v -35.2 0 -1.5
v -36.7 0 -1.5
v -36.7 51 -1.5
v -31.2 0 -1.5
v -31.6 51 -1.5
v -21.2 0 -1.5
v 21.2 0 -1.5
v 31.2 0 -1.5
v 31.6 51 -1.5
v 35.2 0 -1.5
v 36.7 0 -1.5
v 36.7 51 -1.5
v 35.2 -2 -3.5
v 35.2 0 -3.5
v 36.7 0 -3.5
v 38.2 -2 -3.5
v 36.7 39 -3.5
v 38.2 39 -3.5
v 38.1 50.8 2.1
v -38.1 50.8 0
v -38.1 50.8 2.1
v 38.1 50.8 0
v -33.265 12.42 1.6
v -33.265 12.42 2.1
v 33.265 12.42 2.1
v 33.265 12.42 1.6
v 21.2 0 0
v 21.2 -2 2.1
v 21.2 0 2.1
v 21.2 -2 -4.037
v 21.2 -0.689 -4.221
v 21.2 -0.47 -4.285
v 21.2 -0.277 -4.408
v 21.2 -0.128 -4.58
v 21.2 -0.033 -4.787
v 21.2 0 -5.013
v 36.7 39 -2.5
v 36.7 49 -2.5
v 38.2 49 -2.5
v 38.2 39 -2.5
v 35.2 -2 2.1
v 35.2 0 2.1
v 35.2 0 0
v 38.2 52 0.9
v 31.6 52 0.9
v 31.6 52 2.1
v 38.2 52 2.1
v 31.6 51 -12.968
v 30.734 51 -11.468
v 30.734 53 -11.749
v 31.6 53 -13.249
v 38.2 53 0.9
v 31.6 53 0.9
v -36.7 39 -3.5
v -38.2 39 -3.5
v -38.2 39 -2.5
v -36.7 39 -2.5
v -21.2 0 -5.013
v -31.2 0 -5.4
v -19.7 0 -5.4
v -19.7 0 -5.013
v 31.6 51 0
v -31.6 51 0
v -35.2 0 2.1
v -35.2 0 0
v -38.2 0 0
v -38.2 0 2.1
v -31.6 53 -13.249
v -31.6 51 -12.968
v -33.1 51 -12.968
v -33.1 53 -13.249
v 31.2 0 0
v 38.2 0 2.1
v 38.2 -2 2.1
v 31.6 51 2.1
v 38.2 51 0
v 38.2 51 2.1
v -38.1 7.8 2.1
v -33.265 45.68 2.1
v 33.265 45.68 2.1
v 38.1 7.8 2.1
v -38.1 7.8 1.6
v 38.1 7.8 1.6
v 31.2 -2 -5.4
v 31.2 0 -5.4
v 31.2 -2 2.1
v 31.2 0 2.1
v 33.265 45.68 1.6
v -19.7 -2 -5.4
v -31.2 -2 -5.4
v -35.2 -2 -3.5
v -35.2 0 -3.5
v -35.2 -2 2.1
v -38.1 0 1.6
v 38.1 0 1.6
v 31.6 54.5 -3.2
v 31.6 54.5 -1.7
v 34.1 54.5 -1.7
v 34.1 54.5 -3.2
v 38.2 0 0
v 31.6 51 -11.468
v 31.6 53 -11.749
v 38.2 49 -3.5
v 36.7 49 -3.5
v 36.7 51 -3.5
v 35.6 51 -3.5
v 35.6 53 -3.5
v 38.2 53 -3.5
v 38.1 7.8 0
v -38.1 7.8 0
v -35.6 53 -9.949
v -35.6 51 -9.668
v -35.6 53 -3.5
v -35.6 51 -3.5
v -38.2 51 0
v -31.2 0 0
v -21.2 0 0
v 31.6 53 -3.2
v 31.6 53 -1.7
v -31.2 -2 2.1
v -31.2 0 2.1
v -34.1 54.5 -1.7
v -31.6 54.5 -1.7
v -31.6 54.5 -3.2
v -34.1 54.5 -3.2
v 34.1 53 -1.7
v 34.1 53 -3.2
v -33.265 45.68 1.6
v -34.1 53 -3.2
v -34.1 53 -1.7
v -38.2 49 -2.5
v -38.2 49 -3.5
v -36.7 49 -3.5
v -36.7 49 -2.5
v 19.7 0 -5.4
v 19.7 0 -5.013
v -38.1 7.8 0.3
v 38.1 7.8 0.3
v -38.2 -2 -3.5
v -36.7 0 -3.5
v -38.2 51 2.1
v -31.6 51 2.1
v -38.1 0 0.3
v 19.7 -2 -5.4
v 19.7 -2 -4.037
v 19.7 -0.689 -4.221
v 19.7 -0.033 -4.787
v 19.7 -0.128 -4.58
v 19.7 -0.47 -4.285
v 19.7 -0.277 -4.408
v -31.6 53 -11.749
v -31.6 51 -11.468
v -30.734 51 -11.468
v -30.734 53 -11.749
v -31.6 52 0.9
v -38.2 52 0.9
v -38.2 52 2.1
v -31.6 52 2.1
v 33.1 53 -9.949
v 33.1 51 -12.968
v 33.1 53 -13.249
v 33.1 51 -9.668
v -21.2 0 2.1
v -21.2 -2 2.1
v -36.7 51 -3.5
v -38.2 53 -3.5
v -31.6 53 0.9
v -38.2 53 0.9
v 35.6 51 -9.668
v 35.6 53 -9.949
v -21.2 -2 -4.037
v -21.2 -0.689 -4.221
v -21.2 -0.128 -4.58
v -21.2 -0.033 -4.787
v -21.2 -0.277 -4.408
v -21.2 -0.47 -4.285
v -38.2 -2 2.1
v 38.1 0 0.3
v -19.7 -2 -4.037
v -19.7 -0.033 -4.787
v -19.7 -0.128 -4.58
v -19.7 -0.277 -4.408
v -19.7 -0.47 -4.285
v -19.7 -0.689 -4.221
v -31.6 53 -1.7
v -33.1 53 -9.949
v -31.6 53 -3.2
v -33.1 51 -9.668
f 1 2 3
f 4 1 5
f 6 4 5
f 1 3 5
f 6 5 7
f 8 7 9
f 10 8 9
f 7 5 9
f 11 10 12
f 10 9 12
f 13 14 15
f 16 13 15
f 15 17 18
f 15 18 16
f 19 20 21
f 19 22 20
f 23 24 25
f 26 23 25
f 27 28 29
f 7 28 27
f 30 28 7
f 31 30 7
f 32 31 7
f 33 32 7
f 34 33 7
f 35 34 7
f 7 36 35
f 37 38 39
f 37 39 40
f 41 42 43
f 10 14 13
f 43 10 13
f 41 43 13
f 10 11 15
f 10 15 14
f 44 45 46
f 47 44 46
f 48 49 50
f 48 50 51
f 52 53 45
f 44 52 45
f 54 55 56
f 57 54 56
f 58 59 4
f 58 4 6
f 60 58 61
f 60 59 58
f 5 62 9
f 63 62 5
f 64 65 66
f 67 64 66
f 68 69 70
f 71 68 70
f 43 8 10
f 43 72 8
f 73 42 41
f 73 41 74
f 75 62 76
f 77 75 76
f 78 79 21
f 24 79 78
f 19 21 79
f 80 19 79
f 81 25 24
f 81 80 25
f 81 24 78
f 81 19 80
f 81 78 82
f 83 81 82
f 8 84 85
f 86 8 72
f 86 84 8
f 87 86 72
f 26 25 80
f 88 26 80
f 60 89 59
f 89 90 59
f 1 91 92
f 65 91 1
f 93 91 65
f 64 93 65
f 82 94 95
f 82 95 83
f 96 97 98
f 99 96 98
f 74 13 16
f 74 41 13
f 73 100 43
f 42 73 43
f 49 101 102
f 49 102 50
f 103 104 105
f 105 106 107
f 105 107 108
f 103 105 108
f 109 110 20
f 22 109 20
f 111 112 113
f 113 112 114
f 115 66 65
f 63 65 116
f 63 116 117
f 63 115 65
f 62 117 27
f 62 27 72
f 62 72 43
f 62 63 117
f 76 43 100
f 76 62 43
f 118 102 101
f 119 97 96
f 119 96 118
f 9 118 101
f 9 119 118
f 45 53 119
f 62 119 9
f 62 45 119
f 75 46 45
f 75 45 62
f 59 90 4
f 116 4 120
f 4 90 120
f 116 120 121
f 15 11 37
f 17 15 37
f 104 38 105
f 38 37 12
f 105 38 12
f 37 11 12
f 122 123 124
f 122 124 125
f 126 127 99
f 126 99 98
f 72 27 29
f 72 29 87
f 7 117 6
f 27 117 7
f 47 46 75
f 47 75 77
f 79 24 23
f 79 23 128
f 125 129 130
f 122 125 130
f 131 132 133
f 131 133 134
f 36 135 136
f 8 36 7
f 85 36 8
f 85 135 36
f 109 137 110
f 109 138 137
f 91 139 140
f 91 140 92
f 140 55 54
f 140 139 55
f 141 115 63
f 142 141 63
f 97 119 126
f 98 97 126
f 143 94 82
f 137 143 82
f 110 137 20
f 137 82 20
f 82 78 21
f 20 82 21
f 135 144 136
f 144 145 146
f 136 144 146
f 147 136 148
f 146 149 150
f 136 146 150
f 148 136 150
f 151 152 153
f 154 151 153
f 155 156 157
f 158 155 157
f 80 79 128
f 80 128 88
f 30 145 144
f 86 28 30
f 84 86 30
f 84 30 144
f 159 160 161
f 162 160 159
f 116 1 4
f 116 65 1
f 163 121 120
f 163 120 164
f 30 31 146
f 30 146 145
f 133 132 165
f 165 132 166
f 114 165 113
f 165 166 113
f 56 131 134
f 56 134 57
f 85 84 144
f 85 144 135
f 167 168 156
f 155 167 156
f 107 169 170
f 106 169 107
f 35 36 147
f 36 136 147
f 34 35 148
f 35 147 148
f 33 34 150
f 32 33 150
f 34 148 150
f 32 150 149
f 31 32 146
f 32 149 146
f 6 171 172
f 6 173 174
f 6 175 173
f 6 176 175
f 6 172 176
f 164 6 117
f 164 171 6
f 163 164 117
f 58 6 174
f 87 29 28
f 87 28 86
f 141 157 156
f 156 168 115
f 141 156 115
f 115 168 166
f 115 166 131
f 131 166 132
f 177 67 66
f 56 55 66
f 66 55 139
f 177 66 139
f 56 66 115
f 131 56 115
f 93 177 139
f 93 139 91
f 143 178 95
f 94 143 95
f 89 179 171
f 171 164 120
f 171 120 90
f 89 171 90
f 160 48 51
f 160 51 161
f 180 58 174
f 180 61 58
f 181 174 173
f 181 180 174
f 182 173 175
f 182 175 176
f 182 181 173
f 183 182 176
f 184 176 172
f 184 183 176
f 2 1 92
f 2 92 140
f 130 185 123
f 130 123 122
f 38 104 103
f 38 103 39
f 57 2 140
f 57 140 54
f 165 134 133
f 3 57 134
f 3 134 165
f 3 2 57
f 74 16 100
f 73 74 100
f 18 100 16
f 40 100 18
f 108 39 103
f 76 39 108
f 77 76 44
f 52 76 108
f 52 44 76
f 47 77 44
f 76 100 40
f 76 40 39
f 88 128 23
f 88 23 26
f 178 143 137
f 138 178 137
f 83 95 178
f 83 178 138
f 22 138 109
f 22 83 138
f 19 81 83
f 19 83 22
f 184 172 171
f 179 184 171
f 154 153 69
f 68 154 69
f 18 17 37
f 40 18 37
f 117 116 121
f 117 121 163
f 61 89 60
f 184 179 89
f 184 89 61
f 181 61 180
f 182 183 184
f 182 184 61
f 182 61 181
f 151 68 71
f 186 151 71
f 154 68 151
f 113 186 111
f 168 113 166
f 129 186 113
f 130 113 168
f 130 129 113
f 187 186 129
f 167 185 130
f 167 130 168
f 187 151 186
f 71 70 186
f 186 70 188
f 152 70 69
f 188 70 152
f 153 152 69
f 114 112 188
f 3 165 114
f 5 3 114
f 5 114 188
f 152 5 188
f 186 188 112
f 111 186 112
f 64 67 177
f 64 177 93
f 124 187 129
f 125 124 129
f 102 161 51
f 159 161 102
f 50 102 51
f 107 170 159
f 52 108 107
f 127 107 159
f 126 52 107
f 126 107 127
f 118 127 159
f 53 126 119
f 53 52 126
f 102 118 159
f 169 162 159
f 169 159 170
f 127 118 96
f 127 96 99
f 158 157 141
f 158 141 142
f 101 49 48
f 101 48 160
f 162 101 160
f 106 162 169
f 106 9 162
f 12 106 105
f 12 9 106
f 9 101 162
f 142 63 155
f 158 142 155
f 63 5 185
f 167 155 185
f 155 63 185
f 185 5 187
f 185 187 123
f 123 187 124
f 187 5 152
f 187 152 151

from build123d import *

# Parameters (mm, degrees)
F0_W      = 1.5
F0_H      = 51
F1_DEPTH  = 1.5
F2_DEPTH  = 3.5
F0_W_2    = 10
F0_H_2    = 2
F0_W_3    = 20
F3_DEPTH  = 5.4
F4_DEPTH  = 2.1
F5_W      = 72
F5_H      = 30
F6_DEPTH  = 1
F7_W      = 7.8
F7_H      = 1.3
F8_DEPTH  = 38.1
F9_W      = 66.53
F9_H      = 33.26
F10_DEPTH = 0.5
F12_DEPTH = 1.5
F13_R     = 0.8
F16_W     = 2.5
F16_H     = 1.5
F17_DEPTH = 1.5
F18_W     = 10
F18_H     = 1
F18_W_2   = 1
F18_H_2   = 1.2
F19_DEPTH = 76.401
F20_DEPTH = 1
F21_DEPTH = 7.501


# Not quite as in the source:
# - a pattern or mirror of a feature is missing from the dataset's text; its kind, count and spacing are read off the source's solid


with BuildPart() as f1:
    # F0 (on Top) → F1 (new body)
    with BuildSketch(Plane.XY):
        Polygon((-31.6, 51), (-36.7, 51), (-36.7, 0), (-35.2, 0), (-31.2, 0), (-21.2, 0), (-10, 0), (10, 0), (21.2, 0), (31.2, 0), (35.2, 0), (36.7, 0), (36.7, 51), (31.6, 51), align=None)
        with Locations((-37.45, 25.5)):
            Rectangle(F0_W, F0_H)
        with Locations((37.45, 25.5)):
            Rectangle(F0_W, F0_H)
    extrude(amount=-F1_DEPTH)

    # F0 (on Top) → F2 (join)
    with BuildSketch(Plane.XY):
        Polygon((-36.7, 0), (-38.2, 0), (-38.2, -2), (-35.2, -2), (-35.2, 0), align=None)
        Polygon((38.2, 0), (36.7, 0), (35.2, 0), (35.2, -2), (38.2, -2), align=None)
        with Locations((37.45, 25.5)):
            Rectangle(F0_W, F0_H)
        Polygon((31.6, 53), (31.6, 51), (36.7, 51), (38.2, 51), (38.2, 53), align=None)
        Polygon((-38.2, 53), (-38.2, 51), (-36.7, 51), (-31.6, 51), (-31.6, 53), align=None)
        with Locations((-37.45, 25.5)):
            Rectangle(F0_W, F0_H)
    extrude(amount=-F2_DEPTH)

    # F0 (on Top) → F3 (join)
    with BuildSketch(Plane.XY):
        with Locations((-26.2, -1)):
            Rectangle(F0_W_2, F0_H_2)
        with Locations((0, -1)):
            Rectangle(F0_W_3, F0_H_2)
        with Locations((26.2, -1)):
            Rectangle(F0_W_2, F0_H_2)
    extrude(amount=-F3_DEPTH)

    # F0 (on Top) → F4 (join)
    with BuildSketch(Plane.XY):
        Polygon((-38.2, 53), (-38.2, 51), (-36.7, 51), (-31.6, 51), (-31.6, 53), align=None)
        Polygon((31.6, 53), (31.6, 51), (36.7, 51), (38.2, 51), (38.2, 53), align=None)
        Polygon((-36.7, 0), (-38.2, 0), (-38.2, -2), (-35.2, -2), (-35.2, 0), align=None)
        with Locations((-26.2, -1)):
            Rectangle(F0_W_2, F0_H_2)
        with Locations((26.2, -1)):
            Rectangle(F0_W_2, F0_H_2)
        Polygon((38.2, 0), (36.7, 0), (35.2, 0), (35.2, -2), (38.2, -2), align=None)
        with Locations((0, -1)):
            Rectangle(F0_W_3, F0_H_2)
    extrude(amount=F4_DEPTH)

    # F5 (on face) → F6 (join)
    with BuildSketch(Plane(origin=(0, 0, -1.5), x_dir=(1, 0, 0), z_dir=(0, 0, -1))):
        with Locations((0, -15)):
            Rectangle(F5_W, F5_H)
    extrude(amount=F6_DEPTH)

    # F11 (on face) → F12 (join)
    with BuildSketch(Plane.YZ.offset(-21.2)):
        Polygon((-2, -4.0366079611), (-2, -5.4), (0, -5.4), (0, -4.3176896305), align=None)
    f12 = extrude(amount=F12_DEPTH)

    # F12_copies: F12 across plane
    add(f12.mirror(Plane(origin=(0, 0, 0), x_dir=(0, 0, 1), z_dir=(1, 0, 0))))

    # F13
    f13_edges = [f1.edges().sort_by_distance(p)[0] for p in [
        (20.45, 0, -4.31769),
        (-20.45, 0, -4.31769),
    ]]
    fillet(f13_edges, radius=F13_R)

    # F15: sweep along a path in F11
    with BuildLine(Plane.YZ.offset(-21.2)) as f15_path:
        Line((53, -9.9486642392), (51, -9.6675825698))
    # F14 (on face) → F15 (sweep)
    with BuildSketch(Plane(origin=(0, 53, 0), x_dir=(-1, 0, 0), z_dir=(0, 1, 0))):
        Polygon((35.6, -3.5), (31.6, -3.5), (31.6, -11.7486642392), (30.7339745962, -11.7486642392), (31.6, -13.2486642392), (33.1, -13.2486642392), (33.1, -9.9486642392), (35.6, -9.9486642392), align=None)
    f15 = sweep(path=f15_path.line)

    # F15_copies: F15 across plane
    add(f15.mirror(Plane(origin=(0, 0, 0), x_dir=(0, 0, 1), z_dir=(1, 0, 0))))

    # F16 (on face) → F17 (join)
    with BuildSketch(Plane(origin=(0, 53, 0), x_dir=(-1, 0, 0), z_dir=(0, 1, 0))):
        with Locations((32.85, -2.45)):
            Rectangle(F16_W, F16_H)
    f17 = extrude(amount=F17_DEPTH)

    # F17_copies: F17 across plane
    add(f17.mirror(Plane(origin=(0, 0, 0), x_dir=(0, 0, 1), z_dir=(1, 0, 0))))

    # F18 (on face) → F19 (cut, through all)
    with BuildSketch(Plane(origin=(-38.2, 0, 0), x_dir=(0, -1, 0), z_dir=(-1, 0, 0))):
        with Locations((-44, -3)):
            Rectangle(F18_W, F18_H)
        with Locations((-52.5, 1.5)):
            Rectangle(F18_W_2, F18_H_2)
    extrude(amount=-F19_DEPTH, mode=Mode.SUBTRACT)

    # F20 (cut, through all): a face of the model
    f20_faces = [f1.faces().sort_by_distance(p)[0] for p in [
        (0, 15, -2.5),
    ]]
    extrude(f20_faces, amount=-F20_DEPTH, mode=Mode.SUBTRACT)

    # F21 (cut, through all): a face of the model
    f21_faces = [f1.faces().sort_by_distance(p)[0] for p in [
        (0, -1, -5.4),
    ]]
    extrude(f21_faces, amount=-F21_DEPTH, mode=Mode.SUBTRACT)


with BuildPart() as f8:
    # F7 (on Right) → F8 (new body, symmetric)
    with BuildSketch(Plane.YZ):
        Polygon((50.8, 0), (50.8, 2.1), (7.8, 2.1), (7.8, 1.6), (7.8, 0.3), (7.8, 0), align=None)
        with Locations((3.9, 0.95)):
            Rectangle(F7_W, F7_H)
    extrude(amount=F8_DEPTH, both=True)

    # F9 (on face) → F10 (cut)
    with BuildSketch(Plane.XY.offset(2.1)):
        with Locations((0, 29.05)):
            Rectangle(F9_W, F9_H)
    extrude(amount=-F10_DEPTH, mode=Mode.SUBTRACT)


solid = Compound([f1.part, f8.part])
